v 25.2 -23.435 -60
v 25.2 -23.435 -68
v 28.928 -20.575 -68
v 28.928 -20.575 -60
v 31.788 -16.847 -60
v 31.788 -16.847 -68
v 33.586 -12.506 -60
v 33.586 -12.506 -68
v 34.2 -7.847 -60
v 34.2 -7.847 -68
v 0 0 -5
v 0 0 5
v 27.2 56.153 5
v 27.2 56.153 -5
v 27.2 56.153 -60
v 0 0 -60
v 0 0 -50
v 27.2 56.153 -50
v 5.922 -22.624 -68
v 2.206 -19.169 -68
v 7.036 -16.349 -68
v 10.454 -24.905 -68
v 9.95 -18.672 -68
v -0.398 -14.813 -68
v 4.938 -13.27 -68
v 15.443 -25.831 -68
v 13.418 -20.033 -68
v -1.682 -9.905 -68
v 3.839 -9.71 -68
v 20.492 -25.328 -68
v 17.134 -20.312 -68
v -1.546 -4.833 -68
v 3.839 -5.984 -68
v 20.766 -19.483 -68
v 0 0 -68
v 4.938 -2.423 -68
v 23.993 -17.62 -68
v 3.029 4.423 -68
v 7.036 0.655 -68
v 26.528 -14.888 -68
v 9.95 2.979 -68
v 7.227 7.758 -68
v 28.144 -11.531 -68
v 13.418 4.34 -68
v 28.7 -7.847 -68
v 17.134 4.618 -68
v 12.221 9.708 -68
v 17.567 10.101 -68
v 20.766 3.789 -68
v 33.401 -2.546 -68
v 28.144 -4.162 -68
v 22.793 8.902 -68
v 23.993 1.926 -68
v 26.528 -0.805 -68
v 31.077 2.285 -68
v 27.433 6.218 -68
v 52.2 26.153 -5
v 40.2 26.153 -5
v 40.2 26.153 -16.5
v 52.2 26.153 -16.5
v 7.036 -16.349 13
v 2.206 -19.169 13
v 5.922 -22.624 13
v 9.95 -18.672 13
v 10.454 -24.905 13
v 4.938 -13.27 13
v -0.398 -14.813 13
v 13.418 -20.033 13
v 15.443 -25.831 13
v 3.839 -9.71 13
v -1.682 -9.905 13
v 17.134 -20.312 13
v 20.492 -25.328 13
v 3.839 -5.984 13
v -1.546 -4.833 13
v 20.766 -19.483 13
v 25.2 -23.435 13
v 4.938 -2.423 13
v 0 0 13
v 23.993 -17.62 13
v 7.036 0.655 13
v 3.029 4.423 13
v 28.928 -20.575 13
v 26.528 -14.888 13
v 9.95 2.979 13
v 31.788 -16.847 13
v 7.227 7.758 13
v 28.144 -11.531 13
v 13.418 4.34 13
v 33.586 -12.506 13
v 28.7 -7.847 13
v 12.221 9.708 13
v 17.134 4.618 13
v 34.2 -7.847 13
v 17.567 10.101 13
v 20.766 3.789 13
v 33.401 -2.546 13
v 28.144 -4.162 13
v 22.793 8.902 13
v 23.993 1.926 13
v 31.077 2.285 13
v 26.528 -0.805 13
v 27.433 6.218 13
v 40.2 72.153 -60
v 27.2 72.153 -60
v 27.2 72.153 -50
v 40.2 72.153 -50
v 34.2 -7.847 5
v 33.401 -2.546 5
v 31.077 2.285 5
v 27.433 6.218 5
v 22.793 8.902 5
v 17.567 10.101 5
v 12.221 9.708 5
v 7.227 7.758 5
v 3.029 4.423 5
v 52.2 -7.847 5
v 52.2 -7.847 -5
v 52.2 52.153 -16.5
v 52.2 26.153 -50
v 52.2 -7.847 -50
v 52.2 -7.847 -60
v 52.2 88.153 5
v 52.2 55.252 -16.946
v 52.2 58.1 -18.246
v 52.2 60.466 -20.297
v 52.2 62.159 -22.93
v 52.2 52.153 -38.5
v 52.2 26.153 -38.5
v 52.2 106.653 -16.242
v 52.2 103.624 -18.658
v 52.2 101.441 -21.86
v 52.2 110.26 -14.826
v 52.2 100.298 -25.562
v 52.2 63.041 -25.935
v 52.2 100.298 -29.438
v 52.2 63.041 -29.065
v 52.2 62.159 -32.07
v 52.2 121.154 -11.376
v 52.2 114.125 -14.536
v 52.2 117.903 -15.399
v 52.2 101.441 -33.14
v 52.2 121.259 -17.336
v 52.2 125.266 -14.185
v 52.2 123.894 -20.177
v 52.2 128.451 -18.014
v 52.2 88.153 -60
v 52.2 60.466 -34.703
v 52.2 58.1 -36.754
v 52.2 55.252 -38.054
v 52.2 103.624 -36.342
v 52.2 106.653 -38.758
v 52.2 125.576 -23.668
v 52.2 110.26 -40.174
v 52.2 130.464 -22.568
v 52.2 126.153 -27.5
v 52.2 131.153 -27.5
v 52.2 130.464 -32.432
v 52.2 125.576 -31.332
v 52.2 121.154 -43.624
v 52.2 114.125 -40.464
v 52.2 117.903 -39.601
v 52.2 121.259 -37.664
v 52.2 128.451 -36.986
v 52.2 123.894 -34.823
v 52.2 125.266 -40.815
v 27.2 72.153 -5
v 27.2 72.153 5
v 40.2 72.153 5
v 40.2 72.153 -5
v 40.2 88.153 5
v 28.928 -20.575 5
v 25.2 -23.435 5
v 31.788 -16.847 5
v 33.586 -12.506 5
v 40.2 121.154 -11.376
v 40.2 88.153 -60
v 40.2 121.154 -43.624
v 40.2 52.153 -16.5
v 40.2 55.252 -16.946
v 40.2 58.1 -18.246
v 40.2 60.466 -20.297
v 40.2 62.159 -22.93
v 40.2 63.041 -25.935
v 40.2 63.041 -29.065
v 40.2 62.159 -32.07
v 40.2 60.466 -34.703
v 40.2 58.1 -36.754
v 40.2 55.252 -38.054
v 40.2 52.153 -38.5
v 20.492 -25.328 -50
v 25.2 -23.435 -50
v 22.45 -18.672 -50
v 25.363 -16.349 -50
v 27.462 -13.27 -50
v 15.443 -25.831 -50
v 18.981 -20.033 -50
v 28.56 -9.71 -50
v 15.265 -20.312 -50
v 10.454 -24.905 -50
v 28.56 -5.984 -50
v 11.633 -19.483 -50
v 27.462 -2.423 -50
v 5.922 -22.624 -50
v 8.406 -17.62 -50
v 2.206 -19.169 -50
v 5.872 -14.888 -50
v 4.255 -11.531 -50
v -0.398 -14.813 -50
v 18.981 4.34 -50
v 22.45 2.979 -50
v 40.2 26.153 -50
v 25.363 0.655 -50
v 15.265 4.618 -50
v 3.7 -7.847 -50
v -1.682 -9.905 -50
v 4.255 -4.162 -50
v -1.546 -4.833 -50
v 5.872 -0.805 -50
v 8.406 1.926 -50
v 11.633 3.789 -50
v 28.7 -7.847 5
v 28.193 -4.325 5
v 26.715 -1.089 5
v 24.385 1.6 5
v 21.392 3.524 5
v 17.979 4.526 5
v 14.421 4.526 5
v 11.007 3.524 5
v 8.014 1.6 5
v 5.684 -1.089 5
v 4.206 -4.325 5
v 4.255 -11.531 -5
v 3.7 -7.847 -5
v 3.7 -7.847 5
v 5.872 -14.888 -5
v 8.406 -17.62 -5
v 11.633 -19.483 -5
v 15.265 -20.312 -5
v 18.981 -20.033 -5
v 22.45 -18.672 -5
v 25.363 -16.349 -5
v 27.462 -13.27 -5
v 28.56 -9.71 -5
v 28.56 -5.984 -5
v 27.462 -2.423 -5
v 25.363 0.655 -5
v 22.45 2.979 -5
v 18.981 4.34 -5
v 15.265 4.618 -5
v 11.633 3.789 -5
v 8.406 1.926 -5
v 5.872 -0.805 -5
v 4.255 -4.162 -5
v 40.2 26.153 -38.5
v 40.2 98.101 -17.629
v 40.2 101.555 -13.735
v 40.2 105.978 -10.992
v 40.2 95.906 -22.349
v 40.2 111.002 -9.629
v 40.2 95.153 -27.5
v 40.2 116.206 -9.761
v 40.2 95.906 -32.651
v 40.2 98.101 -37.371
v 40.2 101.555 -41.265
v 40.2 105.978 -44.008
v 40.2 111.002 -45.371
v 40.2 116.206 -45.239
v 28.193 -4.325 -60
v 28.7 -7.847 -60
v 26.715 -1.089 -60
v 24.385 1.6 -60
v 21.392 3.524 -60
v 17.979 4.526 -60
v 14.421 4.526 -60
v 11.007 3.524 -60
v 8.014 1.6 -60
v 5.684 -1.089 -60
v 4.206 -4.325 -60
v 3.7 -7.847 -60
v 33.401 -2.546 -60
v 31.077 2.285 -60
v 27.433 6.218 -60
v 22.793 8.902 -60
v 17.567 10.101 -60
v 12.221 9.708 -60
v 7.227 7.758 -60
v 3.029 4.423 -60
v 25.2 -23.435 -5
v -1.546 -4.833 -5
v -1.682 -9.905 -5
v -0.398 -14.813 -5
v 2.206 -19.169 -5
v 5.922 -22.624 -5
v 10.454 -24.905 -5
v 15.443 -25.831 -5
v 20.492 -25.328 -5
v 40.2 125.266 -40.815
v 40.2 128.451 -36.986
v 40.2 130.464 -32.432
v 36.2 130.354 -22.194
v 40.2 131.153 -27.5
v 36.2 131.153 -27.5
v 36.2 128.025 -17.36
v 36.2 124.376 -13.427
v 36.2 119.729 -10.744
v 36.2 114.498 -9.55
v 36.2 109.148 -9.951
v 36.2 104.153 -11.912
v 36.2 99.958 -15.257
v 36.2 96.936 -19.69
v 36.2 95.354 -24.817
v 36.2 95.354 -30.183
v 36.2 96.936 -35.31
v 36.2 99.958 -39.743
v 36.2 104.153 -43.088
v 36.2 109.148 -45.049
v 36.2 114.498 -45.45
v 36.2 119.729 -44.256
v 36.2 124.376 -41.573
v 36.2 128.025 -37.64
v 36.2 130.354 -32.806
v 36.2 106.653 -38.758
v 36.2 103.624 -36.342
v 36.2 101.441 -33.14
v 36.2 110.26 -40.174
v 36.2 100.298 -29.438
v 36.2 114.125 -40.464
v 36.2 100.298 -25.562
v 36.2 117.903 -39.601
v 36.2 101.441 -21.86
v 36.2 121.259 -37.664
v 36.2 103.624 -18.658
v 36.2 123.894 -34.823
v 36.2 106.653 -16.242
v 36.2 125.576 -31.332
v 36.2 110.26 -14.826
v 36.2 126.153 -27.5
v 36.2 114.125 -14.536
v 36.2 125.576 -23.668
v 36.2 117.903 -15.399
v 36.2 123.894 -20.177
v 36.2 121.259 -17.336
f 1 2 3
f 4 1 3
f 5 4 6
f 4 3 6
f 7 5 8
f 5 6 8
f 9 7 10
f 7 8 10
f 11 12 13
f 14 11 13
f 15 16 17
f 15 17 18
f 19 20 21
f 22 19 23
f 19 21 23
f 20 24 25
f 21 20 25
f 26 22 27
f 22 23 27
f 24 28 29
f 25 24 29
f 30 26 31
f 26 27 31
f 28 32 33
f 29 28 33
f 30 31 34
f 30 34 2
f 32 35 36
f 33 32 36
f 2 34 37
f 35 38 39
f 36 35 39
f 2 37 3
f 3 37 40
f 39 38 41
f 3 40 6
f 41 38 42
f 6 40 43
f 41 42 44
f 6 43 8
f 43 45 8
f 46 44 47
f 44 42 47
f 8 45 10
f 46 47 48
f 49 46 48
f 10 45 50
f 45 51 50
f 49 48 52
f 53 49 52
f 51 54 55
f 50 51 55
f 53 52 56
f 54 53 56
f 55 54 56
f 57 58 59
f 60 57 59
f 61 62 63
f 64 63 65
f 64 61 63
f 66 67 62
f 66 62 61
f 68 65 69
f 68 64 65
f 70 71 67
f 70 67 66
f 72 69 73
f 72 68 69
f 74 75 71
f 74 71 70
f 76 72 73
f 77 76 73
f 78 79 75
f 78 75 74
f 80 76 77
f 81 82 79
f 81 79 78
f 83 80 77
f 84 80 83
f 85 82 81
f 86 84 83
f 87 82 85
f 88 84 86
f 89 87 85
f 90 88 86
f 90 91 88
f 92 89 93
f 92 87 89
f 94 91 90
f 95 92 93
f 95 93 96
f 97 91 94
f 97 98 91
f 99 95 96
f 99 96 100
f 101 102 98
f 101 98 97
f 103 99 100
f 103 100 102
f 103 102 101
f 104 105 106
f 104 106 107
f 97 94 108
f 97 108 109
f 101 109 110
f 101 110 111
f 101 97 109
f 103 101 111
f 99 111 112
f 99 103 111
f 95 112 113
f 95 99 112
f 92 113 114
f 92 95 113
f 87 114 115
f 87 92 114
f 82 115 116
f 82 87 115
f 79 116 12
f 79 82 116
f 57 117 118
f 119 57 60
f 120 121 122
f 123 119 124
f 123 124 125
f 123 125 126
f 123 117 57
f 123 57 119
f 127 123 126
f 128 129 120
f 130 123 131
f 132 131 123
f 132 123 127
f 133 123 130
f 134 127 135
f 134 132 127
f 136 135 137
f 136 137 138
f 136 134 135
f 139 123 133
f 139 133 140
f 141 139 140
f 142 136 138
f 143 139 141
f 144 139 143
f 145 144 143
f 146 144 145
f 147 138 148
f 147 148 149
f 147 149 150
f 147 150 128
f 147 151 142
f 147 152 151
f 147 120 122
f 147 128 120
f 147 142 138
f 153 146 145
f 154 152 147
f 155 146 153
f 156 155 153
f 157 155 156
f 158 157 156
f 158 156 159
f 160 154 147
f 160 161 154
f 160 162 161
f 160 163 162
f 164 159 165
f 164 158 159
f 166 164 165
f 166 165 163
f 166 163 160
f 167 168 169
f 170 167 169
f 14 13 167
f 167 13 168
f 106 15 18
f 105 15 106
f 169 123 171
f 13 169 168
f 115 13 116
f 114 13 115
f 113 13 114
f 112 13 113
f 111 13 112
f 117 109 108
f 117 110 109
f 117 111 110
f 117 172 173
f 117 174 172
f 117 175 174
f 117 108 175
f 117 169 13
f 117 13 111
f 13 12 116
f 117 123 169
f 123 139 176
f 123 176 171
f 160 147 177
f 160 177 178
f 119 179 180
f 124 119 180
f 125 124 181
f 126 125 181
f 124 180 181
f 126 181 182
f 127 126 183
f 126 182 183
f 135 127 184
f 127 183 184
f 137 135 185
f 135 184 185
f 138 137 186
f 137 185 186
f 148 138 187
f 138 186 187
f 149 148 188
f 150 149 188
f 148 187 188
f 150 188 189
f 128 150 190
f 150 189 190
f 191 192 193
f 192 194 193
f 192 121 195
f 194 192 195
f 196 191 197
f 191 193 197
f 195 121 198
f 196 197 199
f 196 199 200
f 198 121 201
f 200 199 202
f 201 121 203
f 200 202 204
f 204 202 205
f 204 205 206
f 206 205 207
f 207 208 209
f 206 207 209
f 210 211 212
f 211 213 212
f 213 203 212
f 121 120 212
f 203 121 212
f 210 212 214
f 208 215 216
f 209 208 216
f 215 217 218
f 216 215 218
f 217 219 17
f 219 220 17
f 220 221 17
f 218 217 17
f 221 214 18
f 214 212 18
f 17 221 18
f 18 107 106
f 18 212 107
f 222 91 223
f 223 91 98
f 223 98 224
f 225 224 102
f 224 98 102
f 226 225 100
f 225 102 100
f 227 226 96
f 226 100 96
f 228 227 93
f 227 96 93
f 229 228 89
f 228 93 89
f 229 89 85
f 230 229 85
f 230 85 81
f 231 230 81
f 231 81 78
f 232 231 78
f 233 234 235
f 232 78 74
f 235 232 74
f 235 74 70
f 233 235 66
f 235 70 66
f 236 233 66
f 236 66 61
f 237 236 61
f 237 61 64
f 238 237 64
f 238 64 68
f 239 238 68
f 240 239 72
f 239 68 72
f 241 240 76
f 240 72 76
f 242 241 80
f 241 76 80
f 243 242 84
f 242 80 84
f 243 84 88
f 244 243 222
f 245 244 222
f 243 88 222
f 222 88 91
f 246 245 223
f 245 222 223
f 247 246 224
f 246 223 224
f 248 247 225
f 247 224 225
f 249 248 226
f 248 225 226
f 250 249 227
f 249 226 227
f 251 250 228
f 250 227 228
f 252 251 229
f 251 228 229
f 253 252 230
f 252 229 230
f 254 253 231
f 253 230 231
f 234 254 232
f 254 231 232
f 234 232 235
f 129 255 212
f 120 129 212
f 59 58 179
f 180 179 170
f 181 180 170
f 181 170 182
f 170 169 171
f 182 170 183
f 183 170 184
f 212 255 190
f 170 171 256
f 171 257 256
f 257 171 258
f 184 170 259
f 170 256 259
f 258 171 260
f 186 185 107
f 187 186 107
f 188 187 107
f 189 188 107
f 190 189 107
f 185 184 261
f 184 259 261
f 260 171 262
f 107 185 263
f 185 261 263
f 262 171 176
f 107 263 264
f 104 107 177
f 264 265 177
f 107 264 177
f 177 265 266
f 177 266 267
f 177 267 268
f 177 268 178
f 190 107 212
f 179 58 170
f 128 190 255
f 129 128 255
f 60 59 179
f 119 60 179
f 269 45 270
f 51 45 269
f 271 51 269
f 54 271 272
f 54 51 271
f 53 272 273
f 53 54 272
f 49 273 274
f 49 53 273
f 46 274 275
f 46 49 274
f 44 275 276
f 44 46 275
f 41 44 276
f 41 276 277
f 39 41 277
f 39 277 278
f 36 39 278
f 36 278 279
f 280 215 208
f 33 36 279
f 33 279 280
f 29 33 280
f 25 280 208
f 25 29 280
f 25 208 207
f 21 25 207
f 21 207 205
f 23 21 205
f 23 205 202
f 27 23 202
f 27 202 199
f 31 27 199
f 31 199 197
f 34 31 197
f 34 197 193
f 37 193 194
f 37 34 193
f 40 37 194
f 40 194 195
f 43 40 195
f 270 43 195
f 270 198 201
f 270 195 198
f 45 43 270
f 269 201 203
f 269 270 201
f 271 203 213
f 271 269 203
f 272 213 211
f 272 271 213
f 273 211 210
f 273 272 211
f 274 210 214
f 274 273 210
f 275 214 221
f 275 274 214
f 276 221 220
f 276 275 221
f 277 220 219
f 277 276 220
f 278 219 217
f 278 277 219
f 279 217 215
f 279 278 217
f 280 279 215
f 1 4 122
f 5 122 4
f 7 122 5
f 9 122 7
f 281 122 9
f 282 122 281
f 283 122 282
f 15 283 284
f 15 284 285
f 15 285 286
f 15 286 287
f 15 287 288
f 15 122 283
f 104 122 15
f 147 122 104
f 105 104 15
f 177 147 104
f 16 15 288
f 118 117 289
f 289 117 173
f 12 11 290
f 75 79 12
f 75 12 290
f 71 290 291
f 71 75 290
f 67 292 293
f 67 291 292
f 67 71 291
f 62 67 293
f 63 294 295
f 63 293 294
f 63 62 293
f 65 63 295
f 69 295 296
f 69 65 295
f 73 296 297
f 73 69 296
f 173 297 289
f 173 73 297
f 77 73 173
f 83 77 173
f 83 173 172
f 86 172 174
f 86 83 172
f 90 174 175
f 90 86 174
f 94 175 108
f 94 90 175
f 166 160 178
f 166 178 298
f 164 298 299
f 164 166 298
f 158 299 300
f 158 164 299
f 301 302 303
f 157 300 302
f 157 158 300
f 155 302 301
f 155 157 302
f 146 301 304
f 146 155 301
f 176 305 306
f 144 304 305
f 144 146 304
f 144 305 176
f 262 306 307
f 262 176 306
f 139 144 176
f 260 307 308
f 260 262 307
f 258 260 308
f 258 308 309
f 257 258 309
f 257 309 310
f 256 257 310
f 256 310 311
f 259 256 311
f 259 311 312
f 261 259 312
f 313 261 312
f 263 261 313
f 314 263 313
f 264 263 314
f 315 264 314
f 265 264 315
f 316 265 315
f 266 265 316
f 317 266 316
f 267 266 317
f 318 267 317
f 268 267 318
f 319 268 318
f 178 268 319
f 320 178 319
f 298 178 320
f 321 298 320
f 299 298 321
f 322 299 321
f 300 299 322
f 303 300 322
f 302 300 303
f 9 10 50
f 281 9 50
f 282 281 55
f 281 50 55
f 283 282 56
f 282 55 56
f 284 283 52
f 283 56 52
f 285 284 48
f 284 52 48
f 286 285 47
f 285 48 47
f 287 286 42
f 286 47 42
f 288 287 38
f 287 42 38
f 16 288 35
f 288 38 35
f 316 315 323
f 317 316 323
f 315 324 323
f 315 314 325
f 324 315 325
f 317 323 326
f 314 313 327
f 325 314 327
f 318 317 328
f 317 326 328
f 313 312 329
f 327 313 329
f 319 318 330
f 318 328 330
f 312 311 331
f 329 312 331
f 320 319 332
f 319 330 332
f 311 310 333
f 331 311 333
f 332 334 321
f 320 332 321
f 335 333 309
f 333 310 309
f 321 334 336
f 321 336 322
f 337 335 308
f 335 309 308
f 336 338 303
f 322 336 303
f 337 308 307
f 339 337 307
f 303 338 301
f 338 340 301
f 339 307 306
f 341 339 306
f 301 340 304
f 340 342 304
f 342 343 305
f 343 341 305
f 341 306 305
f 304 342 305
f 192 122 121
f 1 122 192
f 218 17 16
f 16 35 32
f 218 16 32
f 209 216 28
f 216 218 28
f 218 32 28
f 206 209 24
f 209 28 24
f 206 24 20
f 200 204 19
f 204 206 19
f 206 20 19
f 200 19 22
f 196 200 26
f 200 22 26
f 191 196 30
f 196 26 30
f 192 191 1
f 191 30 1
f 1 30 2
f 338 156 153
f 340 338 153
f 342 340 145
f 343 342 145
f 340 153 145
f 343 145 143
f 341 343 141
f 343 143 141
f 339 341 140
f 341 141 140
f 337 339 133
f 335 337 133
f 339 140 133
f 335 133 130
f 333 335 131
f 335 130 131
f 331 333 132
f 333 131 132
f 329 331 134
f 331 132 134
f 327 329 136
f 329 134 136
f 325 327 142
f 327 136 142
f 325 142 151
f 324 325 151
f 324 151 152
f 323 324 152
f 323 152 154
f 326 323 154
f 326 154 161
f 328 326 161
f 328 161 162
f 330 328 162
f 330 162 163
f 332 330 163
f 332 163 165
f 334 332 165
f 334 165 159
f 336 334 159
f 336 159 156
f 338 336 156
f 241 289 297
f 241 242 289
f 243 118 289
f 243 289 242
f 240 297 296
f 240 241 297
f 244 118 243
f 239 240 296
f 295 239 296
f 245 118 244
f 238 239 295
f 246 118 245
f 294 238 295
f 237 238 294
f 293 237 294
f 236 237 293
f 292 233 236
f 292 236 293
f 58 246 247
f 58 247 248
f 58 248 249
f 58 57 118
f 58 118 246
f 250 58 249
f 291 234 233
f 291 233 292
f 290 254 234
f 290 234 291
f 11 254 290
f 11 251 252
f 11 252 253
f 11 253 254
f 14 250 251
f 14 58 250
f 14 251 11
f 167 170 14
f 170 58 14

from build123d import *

# Parameters (mm, degrees)
BOSS_EXTRUDE1_DEPTH = 5
BOSS_EXTRUDE2_START = 8
SKETCH2_R           = 12.5
BOSS_EXTRUDE2_DEPTH = 8
CUT_EXTRUDE1_REACH  = 91.615
SKETCH3_R           = 12.5
SKETCH5_R           = 13
BOSS_EXTRUDE3_DEPTH = 12
SKETCH6_R           = 18
SKETCH6_R_2         = 13
BOSS_EXTRUDE4_DEPTH = 16
CUT_EXTRUDE2_REACH  = 160.918
SKETCH7_R           = 12.5
BOSS_EXTRUDE5_DEPTH = 12


with BuildPart() as part:
    # Sketch1 → Boss-Extrude1 (new, symmetric)
    with BuildSketch(Plane.XY):
        with BuildLine():
            Line((27.199616854, 56.153190853), (27.199616854, 72.153190853))
            Line((27.199616854, 72.153190853), (52.199616854, 72.153190853))
            Line((52.199616854, 72.153190853), (52.199616854, -7.846809147))
            Line((52.199616854, -7.846809147), (25.199616854, -23.435266415))
            ThreePointArc((25.199616854, -23.435266415), (3.94149511, -21.027797399), (0, 0))
            Line((0, 0), (27.199616854, 56.153190853))
        make_face()
    boss_extrude1 = extrude(amount=BOSS_EXTRUDE1_DEPTH, both=True)

    # Sketch2 → Boss-Extrude2 (add)
    with BuildSketch(Plane.XY.offset(5).offset(BOSS_EXTRUDE2_START)):
        with BuildLine():
            ThreePointArc((34.199616854, -7.846809147), (20.224967561, 9.697322399), (0, 0))
            ThreePointArc((0, 0), (3.94149511, -21.027797399), (25.199616854, -23.435266415))
            ThreePointArc((25.199616854, -23.435266415), (31.788074122, -16.846809147), (34.199616854, -7.846809147))
        make_face()
        with Locations((16.199616854, -7.846809147)):
            Circle(SKETCH2_R, mode=Mode.SUBTRACT)
    boss_extrude2 = extrude(amount=-BOSS_EXTRUDE2_DEPTH)

    # Sketch3 → Cut-Extrude1 (cut, up to next)
    with BuildSketch(Plane.XY.offset(5), mode=Mode.PRIVATE) as cut_extrude1_sk1:
        with Locations(Location((16.199616854, -7.846809147, 0), (0, 0, 180))):
            Circle(SKETCH3_R)
    cut_extrude1_tool1 = extrude(cut_extrude1_sk1.sketch, amount=-CUT_EXTRUDE1_REACH, mode=Mode.PRIVATE) & part.part
    add(cut_extrude1_tool1.solids().sort_by_distance((16.199617, -7.846809, 5))[0], mode=Mode.SUBTRACT)

    # Sketch5 → Boss-Extrude3 (add)
    with BuildSketch(Plane(origin=(52.199616854, 0, 0), x_dir=(0, 0, -1), z_dir=(1, 0, 0))):
        with BuildLine():
            Line((11.376048584, 121.154327694), (-5, 88.153190853))
            Line((-5, 88.153190853), (-5, 72.153190853))
            Line((-5, 72.153190853), (60, 72.153190853))
            Line((60, 72.153190853), (60, 88.153190853))
            Line((60, 88.153190853), (43.623951416, 121.154327694))
            ThreePointArc((43.623951416, 121.154327694), (27.5, 131.153190853), (11.376048584, 121.154327694))
        make_face()
        with Locations(Location((27.5, 113.153190853, 0), (0, 0, 90))):
            Circle(SKETCH5_R, mode=Mode.SUBTRACT)
    extrude(amount=-BOSS_EXTRUDE3_DEPTH)

    # Sketch6 → Boss-Extrude4 (add)
    with BuildSketch(Plane(origin=(52.199616854, 0, 0), x_dir=(0, 0, -1), z_dir=(1, 0, 0))):
        with Locations(Location((27.5, 113.153190853, 0), (0, 0, 90))):
            Circle(SKETCH6_R)
        with Locations(Location((27.5, 113.153190853, 0), (0, 0, 90))):
            Circle(SKETCH6_R_2, mode=Mode.SUBTRACT)
    extrude(amount=-BOSS_EXTRUDE4_DEPTH)

    # Mirror1: Boss-Extrude1, Boss-Extrude2 across plane
    add(boss_extrude1.mirror(Plane.XY.offset(-27.5)))
    add(boss_extrude2.mirror(Plane.XY.offset(-27.5)))

    # Sketch7 → Cut-Extrude2 (cut, up to next)
    with BuildSketch(Plane(origin=(0, 0, -60), x_dir=(-1, 0, 0), z_dir=(0, 0, -1)), mode=Mode.PRIVATE) as cut_extrude2_sk1:
        with Locations((-16.199616854, -7.846809147)):
            Circle(SKETCH7_R)
    cut_extrude2_tool1 = extrude(cut_extrude2_sk1.sketch, amount=-CUT_EXTRUDE2_REACH, mode=Mode.PRIVATE) & part.part
    add(cut_extrude2_tool1.solids().sort_by_distance((16.199617, -7.846809, -60))[0], mode=Mode.SUBTRACT)

    # Sketch8 → Boss-Extrude5 (add)
    with BuildSketch(Plane.ZY.offset(-40.199616854)):
        with BuildLine():
            Line((-5, 26.153190853), (-16.5, 26.153190853))
            Line((-16.5, 26.153190853), (-16.5, 52.153190853))
            ThreePointArc((-16.5, 52.153190853), (-27.5, 63.153190853), (-38.5, 52.153190853))
            Line((-38.5, 52.153190853), (-38.5, 26.153190853))
            Line((-38.5, 26.153190853), (-50, 26.153190853))
            Line((-50, 26.153190853), (-50, 72.153190853))
            Line((-50, 72.153190853), (-5, 72.153190853))
            Line((-5, 72.153190853), (-5, 26.153190853))
        make_face()
    extrude(amount=-BOSS_EXTRUDE5_DEPTH)


solid = part.part
